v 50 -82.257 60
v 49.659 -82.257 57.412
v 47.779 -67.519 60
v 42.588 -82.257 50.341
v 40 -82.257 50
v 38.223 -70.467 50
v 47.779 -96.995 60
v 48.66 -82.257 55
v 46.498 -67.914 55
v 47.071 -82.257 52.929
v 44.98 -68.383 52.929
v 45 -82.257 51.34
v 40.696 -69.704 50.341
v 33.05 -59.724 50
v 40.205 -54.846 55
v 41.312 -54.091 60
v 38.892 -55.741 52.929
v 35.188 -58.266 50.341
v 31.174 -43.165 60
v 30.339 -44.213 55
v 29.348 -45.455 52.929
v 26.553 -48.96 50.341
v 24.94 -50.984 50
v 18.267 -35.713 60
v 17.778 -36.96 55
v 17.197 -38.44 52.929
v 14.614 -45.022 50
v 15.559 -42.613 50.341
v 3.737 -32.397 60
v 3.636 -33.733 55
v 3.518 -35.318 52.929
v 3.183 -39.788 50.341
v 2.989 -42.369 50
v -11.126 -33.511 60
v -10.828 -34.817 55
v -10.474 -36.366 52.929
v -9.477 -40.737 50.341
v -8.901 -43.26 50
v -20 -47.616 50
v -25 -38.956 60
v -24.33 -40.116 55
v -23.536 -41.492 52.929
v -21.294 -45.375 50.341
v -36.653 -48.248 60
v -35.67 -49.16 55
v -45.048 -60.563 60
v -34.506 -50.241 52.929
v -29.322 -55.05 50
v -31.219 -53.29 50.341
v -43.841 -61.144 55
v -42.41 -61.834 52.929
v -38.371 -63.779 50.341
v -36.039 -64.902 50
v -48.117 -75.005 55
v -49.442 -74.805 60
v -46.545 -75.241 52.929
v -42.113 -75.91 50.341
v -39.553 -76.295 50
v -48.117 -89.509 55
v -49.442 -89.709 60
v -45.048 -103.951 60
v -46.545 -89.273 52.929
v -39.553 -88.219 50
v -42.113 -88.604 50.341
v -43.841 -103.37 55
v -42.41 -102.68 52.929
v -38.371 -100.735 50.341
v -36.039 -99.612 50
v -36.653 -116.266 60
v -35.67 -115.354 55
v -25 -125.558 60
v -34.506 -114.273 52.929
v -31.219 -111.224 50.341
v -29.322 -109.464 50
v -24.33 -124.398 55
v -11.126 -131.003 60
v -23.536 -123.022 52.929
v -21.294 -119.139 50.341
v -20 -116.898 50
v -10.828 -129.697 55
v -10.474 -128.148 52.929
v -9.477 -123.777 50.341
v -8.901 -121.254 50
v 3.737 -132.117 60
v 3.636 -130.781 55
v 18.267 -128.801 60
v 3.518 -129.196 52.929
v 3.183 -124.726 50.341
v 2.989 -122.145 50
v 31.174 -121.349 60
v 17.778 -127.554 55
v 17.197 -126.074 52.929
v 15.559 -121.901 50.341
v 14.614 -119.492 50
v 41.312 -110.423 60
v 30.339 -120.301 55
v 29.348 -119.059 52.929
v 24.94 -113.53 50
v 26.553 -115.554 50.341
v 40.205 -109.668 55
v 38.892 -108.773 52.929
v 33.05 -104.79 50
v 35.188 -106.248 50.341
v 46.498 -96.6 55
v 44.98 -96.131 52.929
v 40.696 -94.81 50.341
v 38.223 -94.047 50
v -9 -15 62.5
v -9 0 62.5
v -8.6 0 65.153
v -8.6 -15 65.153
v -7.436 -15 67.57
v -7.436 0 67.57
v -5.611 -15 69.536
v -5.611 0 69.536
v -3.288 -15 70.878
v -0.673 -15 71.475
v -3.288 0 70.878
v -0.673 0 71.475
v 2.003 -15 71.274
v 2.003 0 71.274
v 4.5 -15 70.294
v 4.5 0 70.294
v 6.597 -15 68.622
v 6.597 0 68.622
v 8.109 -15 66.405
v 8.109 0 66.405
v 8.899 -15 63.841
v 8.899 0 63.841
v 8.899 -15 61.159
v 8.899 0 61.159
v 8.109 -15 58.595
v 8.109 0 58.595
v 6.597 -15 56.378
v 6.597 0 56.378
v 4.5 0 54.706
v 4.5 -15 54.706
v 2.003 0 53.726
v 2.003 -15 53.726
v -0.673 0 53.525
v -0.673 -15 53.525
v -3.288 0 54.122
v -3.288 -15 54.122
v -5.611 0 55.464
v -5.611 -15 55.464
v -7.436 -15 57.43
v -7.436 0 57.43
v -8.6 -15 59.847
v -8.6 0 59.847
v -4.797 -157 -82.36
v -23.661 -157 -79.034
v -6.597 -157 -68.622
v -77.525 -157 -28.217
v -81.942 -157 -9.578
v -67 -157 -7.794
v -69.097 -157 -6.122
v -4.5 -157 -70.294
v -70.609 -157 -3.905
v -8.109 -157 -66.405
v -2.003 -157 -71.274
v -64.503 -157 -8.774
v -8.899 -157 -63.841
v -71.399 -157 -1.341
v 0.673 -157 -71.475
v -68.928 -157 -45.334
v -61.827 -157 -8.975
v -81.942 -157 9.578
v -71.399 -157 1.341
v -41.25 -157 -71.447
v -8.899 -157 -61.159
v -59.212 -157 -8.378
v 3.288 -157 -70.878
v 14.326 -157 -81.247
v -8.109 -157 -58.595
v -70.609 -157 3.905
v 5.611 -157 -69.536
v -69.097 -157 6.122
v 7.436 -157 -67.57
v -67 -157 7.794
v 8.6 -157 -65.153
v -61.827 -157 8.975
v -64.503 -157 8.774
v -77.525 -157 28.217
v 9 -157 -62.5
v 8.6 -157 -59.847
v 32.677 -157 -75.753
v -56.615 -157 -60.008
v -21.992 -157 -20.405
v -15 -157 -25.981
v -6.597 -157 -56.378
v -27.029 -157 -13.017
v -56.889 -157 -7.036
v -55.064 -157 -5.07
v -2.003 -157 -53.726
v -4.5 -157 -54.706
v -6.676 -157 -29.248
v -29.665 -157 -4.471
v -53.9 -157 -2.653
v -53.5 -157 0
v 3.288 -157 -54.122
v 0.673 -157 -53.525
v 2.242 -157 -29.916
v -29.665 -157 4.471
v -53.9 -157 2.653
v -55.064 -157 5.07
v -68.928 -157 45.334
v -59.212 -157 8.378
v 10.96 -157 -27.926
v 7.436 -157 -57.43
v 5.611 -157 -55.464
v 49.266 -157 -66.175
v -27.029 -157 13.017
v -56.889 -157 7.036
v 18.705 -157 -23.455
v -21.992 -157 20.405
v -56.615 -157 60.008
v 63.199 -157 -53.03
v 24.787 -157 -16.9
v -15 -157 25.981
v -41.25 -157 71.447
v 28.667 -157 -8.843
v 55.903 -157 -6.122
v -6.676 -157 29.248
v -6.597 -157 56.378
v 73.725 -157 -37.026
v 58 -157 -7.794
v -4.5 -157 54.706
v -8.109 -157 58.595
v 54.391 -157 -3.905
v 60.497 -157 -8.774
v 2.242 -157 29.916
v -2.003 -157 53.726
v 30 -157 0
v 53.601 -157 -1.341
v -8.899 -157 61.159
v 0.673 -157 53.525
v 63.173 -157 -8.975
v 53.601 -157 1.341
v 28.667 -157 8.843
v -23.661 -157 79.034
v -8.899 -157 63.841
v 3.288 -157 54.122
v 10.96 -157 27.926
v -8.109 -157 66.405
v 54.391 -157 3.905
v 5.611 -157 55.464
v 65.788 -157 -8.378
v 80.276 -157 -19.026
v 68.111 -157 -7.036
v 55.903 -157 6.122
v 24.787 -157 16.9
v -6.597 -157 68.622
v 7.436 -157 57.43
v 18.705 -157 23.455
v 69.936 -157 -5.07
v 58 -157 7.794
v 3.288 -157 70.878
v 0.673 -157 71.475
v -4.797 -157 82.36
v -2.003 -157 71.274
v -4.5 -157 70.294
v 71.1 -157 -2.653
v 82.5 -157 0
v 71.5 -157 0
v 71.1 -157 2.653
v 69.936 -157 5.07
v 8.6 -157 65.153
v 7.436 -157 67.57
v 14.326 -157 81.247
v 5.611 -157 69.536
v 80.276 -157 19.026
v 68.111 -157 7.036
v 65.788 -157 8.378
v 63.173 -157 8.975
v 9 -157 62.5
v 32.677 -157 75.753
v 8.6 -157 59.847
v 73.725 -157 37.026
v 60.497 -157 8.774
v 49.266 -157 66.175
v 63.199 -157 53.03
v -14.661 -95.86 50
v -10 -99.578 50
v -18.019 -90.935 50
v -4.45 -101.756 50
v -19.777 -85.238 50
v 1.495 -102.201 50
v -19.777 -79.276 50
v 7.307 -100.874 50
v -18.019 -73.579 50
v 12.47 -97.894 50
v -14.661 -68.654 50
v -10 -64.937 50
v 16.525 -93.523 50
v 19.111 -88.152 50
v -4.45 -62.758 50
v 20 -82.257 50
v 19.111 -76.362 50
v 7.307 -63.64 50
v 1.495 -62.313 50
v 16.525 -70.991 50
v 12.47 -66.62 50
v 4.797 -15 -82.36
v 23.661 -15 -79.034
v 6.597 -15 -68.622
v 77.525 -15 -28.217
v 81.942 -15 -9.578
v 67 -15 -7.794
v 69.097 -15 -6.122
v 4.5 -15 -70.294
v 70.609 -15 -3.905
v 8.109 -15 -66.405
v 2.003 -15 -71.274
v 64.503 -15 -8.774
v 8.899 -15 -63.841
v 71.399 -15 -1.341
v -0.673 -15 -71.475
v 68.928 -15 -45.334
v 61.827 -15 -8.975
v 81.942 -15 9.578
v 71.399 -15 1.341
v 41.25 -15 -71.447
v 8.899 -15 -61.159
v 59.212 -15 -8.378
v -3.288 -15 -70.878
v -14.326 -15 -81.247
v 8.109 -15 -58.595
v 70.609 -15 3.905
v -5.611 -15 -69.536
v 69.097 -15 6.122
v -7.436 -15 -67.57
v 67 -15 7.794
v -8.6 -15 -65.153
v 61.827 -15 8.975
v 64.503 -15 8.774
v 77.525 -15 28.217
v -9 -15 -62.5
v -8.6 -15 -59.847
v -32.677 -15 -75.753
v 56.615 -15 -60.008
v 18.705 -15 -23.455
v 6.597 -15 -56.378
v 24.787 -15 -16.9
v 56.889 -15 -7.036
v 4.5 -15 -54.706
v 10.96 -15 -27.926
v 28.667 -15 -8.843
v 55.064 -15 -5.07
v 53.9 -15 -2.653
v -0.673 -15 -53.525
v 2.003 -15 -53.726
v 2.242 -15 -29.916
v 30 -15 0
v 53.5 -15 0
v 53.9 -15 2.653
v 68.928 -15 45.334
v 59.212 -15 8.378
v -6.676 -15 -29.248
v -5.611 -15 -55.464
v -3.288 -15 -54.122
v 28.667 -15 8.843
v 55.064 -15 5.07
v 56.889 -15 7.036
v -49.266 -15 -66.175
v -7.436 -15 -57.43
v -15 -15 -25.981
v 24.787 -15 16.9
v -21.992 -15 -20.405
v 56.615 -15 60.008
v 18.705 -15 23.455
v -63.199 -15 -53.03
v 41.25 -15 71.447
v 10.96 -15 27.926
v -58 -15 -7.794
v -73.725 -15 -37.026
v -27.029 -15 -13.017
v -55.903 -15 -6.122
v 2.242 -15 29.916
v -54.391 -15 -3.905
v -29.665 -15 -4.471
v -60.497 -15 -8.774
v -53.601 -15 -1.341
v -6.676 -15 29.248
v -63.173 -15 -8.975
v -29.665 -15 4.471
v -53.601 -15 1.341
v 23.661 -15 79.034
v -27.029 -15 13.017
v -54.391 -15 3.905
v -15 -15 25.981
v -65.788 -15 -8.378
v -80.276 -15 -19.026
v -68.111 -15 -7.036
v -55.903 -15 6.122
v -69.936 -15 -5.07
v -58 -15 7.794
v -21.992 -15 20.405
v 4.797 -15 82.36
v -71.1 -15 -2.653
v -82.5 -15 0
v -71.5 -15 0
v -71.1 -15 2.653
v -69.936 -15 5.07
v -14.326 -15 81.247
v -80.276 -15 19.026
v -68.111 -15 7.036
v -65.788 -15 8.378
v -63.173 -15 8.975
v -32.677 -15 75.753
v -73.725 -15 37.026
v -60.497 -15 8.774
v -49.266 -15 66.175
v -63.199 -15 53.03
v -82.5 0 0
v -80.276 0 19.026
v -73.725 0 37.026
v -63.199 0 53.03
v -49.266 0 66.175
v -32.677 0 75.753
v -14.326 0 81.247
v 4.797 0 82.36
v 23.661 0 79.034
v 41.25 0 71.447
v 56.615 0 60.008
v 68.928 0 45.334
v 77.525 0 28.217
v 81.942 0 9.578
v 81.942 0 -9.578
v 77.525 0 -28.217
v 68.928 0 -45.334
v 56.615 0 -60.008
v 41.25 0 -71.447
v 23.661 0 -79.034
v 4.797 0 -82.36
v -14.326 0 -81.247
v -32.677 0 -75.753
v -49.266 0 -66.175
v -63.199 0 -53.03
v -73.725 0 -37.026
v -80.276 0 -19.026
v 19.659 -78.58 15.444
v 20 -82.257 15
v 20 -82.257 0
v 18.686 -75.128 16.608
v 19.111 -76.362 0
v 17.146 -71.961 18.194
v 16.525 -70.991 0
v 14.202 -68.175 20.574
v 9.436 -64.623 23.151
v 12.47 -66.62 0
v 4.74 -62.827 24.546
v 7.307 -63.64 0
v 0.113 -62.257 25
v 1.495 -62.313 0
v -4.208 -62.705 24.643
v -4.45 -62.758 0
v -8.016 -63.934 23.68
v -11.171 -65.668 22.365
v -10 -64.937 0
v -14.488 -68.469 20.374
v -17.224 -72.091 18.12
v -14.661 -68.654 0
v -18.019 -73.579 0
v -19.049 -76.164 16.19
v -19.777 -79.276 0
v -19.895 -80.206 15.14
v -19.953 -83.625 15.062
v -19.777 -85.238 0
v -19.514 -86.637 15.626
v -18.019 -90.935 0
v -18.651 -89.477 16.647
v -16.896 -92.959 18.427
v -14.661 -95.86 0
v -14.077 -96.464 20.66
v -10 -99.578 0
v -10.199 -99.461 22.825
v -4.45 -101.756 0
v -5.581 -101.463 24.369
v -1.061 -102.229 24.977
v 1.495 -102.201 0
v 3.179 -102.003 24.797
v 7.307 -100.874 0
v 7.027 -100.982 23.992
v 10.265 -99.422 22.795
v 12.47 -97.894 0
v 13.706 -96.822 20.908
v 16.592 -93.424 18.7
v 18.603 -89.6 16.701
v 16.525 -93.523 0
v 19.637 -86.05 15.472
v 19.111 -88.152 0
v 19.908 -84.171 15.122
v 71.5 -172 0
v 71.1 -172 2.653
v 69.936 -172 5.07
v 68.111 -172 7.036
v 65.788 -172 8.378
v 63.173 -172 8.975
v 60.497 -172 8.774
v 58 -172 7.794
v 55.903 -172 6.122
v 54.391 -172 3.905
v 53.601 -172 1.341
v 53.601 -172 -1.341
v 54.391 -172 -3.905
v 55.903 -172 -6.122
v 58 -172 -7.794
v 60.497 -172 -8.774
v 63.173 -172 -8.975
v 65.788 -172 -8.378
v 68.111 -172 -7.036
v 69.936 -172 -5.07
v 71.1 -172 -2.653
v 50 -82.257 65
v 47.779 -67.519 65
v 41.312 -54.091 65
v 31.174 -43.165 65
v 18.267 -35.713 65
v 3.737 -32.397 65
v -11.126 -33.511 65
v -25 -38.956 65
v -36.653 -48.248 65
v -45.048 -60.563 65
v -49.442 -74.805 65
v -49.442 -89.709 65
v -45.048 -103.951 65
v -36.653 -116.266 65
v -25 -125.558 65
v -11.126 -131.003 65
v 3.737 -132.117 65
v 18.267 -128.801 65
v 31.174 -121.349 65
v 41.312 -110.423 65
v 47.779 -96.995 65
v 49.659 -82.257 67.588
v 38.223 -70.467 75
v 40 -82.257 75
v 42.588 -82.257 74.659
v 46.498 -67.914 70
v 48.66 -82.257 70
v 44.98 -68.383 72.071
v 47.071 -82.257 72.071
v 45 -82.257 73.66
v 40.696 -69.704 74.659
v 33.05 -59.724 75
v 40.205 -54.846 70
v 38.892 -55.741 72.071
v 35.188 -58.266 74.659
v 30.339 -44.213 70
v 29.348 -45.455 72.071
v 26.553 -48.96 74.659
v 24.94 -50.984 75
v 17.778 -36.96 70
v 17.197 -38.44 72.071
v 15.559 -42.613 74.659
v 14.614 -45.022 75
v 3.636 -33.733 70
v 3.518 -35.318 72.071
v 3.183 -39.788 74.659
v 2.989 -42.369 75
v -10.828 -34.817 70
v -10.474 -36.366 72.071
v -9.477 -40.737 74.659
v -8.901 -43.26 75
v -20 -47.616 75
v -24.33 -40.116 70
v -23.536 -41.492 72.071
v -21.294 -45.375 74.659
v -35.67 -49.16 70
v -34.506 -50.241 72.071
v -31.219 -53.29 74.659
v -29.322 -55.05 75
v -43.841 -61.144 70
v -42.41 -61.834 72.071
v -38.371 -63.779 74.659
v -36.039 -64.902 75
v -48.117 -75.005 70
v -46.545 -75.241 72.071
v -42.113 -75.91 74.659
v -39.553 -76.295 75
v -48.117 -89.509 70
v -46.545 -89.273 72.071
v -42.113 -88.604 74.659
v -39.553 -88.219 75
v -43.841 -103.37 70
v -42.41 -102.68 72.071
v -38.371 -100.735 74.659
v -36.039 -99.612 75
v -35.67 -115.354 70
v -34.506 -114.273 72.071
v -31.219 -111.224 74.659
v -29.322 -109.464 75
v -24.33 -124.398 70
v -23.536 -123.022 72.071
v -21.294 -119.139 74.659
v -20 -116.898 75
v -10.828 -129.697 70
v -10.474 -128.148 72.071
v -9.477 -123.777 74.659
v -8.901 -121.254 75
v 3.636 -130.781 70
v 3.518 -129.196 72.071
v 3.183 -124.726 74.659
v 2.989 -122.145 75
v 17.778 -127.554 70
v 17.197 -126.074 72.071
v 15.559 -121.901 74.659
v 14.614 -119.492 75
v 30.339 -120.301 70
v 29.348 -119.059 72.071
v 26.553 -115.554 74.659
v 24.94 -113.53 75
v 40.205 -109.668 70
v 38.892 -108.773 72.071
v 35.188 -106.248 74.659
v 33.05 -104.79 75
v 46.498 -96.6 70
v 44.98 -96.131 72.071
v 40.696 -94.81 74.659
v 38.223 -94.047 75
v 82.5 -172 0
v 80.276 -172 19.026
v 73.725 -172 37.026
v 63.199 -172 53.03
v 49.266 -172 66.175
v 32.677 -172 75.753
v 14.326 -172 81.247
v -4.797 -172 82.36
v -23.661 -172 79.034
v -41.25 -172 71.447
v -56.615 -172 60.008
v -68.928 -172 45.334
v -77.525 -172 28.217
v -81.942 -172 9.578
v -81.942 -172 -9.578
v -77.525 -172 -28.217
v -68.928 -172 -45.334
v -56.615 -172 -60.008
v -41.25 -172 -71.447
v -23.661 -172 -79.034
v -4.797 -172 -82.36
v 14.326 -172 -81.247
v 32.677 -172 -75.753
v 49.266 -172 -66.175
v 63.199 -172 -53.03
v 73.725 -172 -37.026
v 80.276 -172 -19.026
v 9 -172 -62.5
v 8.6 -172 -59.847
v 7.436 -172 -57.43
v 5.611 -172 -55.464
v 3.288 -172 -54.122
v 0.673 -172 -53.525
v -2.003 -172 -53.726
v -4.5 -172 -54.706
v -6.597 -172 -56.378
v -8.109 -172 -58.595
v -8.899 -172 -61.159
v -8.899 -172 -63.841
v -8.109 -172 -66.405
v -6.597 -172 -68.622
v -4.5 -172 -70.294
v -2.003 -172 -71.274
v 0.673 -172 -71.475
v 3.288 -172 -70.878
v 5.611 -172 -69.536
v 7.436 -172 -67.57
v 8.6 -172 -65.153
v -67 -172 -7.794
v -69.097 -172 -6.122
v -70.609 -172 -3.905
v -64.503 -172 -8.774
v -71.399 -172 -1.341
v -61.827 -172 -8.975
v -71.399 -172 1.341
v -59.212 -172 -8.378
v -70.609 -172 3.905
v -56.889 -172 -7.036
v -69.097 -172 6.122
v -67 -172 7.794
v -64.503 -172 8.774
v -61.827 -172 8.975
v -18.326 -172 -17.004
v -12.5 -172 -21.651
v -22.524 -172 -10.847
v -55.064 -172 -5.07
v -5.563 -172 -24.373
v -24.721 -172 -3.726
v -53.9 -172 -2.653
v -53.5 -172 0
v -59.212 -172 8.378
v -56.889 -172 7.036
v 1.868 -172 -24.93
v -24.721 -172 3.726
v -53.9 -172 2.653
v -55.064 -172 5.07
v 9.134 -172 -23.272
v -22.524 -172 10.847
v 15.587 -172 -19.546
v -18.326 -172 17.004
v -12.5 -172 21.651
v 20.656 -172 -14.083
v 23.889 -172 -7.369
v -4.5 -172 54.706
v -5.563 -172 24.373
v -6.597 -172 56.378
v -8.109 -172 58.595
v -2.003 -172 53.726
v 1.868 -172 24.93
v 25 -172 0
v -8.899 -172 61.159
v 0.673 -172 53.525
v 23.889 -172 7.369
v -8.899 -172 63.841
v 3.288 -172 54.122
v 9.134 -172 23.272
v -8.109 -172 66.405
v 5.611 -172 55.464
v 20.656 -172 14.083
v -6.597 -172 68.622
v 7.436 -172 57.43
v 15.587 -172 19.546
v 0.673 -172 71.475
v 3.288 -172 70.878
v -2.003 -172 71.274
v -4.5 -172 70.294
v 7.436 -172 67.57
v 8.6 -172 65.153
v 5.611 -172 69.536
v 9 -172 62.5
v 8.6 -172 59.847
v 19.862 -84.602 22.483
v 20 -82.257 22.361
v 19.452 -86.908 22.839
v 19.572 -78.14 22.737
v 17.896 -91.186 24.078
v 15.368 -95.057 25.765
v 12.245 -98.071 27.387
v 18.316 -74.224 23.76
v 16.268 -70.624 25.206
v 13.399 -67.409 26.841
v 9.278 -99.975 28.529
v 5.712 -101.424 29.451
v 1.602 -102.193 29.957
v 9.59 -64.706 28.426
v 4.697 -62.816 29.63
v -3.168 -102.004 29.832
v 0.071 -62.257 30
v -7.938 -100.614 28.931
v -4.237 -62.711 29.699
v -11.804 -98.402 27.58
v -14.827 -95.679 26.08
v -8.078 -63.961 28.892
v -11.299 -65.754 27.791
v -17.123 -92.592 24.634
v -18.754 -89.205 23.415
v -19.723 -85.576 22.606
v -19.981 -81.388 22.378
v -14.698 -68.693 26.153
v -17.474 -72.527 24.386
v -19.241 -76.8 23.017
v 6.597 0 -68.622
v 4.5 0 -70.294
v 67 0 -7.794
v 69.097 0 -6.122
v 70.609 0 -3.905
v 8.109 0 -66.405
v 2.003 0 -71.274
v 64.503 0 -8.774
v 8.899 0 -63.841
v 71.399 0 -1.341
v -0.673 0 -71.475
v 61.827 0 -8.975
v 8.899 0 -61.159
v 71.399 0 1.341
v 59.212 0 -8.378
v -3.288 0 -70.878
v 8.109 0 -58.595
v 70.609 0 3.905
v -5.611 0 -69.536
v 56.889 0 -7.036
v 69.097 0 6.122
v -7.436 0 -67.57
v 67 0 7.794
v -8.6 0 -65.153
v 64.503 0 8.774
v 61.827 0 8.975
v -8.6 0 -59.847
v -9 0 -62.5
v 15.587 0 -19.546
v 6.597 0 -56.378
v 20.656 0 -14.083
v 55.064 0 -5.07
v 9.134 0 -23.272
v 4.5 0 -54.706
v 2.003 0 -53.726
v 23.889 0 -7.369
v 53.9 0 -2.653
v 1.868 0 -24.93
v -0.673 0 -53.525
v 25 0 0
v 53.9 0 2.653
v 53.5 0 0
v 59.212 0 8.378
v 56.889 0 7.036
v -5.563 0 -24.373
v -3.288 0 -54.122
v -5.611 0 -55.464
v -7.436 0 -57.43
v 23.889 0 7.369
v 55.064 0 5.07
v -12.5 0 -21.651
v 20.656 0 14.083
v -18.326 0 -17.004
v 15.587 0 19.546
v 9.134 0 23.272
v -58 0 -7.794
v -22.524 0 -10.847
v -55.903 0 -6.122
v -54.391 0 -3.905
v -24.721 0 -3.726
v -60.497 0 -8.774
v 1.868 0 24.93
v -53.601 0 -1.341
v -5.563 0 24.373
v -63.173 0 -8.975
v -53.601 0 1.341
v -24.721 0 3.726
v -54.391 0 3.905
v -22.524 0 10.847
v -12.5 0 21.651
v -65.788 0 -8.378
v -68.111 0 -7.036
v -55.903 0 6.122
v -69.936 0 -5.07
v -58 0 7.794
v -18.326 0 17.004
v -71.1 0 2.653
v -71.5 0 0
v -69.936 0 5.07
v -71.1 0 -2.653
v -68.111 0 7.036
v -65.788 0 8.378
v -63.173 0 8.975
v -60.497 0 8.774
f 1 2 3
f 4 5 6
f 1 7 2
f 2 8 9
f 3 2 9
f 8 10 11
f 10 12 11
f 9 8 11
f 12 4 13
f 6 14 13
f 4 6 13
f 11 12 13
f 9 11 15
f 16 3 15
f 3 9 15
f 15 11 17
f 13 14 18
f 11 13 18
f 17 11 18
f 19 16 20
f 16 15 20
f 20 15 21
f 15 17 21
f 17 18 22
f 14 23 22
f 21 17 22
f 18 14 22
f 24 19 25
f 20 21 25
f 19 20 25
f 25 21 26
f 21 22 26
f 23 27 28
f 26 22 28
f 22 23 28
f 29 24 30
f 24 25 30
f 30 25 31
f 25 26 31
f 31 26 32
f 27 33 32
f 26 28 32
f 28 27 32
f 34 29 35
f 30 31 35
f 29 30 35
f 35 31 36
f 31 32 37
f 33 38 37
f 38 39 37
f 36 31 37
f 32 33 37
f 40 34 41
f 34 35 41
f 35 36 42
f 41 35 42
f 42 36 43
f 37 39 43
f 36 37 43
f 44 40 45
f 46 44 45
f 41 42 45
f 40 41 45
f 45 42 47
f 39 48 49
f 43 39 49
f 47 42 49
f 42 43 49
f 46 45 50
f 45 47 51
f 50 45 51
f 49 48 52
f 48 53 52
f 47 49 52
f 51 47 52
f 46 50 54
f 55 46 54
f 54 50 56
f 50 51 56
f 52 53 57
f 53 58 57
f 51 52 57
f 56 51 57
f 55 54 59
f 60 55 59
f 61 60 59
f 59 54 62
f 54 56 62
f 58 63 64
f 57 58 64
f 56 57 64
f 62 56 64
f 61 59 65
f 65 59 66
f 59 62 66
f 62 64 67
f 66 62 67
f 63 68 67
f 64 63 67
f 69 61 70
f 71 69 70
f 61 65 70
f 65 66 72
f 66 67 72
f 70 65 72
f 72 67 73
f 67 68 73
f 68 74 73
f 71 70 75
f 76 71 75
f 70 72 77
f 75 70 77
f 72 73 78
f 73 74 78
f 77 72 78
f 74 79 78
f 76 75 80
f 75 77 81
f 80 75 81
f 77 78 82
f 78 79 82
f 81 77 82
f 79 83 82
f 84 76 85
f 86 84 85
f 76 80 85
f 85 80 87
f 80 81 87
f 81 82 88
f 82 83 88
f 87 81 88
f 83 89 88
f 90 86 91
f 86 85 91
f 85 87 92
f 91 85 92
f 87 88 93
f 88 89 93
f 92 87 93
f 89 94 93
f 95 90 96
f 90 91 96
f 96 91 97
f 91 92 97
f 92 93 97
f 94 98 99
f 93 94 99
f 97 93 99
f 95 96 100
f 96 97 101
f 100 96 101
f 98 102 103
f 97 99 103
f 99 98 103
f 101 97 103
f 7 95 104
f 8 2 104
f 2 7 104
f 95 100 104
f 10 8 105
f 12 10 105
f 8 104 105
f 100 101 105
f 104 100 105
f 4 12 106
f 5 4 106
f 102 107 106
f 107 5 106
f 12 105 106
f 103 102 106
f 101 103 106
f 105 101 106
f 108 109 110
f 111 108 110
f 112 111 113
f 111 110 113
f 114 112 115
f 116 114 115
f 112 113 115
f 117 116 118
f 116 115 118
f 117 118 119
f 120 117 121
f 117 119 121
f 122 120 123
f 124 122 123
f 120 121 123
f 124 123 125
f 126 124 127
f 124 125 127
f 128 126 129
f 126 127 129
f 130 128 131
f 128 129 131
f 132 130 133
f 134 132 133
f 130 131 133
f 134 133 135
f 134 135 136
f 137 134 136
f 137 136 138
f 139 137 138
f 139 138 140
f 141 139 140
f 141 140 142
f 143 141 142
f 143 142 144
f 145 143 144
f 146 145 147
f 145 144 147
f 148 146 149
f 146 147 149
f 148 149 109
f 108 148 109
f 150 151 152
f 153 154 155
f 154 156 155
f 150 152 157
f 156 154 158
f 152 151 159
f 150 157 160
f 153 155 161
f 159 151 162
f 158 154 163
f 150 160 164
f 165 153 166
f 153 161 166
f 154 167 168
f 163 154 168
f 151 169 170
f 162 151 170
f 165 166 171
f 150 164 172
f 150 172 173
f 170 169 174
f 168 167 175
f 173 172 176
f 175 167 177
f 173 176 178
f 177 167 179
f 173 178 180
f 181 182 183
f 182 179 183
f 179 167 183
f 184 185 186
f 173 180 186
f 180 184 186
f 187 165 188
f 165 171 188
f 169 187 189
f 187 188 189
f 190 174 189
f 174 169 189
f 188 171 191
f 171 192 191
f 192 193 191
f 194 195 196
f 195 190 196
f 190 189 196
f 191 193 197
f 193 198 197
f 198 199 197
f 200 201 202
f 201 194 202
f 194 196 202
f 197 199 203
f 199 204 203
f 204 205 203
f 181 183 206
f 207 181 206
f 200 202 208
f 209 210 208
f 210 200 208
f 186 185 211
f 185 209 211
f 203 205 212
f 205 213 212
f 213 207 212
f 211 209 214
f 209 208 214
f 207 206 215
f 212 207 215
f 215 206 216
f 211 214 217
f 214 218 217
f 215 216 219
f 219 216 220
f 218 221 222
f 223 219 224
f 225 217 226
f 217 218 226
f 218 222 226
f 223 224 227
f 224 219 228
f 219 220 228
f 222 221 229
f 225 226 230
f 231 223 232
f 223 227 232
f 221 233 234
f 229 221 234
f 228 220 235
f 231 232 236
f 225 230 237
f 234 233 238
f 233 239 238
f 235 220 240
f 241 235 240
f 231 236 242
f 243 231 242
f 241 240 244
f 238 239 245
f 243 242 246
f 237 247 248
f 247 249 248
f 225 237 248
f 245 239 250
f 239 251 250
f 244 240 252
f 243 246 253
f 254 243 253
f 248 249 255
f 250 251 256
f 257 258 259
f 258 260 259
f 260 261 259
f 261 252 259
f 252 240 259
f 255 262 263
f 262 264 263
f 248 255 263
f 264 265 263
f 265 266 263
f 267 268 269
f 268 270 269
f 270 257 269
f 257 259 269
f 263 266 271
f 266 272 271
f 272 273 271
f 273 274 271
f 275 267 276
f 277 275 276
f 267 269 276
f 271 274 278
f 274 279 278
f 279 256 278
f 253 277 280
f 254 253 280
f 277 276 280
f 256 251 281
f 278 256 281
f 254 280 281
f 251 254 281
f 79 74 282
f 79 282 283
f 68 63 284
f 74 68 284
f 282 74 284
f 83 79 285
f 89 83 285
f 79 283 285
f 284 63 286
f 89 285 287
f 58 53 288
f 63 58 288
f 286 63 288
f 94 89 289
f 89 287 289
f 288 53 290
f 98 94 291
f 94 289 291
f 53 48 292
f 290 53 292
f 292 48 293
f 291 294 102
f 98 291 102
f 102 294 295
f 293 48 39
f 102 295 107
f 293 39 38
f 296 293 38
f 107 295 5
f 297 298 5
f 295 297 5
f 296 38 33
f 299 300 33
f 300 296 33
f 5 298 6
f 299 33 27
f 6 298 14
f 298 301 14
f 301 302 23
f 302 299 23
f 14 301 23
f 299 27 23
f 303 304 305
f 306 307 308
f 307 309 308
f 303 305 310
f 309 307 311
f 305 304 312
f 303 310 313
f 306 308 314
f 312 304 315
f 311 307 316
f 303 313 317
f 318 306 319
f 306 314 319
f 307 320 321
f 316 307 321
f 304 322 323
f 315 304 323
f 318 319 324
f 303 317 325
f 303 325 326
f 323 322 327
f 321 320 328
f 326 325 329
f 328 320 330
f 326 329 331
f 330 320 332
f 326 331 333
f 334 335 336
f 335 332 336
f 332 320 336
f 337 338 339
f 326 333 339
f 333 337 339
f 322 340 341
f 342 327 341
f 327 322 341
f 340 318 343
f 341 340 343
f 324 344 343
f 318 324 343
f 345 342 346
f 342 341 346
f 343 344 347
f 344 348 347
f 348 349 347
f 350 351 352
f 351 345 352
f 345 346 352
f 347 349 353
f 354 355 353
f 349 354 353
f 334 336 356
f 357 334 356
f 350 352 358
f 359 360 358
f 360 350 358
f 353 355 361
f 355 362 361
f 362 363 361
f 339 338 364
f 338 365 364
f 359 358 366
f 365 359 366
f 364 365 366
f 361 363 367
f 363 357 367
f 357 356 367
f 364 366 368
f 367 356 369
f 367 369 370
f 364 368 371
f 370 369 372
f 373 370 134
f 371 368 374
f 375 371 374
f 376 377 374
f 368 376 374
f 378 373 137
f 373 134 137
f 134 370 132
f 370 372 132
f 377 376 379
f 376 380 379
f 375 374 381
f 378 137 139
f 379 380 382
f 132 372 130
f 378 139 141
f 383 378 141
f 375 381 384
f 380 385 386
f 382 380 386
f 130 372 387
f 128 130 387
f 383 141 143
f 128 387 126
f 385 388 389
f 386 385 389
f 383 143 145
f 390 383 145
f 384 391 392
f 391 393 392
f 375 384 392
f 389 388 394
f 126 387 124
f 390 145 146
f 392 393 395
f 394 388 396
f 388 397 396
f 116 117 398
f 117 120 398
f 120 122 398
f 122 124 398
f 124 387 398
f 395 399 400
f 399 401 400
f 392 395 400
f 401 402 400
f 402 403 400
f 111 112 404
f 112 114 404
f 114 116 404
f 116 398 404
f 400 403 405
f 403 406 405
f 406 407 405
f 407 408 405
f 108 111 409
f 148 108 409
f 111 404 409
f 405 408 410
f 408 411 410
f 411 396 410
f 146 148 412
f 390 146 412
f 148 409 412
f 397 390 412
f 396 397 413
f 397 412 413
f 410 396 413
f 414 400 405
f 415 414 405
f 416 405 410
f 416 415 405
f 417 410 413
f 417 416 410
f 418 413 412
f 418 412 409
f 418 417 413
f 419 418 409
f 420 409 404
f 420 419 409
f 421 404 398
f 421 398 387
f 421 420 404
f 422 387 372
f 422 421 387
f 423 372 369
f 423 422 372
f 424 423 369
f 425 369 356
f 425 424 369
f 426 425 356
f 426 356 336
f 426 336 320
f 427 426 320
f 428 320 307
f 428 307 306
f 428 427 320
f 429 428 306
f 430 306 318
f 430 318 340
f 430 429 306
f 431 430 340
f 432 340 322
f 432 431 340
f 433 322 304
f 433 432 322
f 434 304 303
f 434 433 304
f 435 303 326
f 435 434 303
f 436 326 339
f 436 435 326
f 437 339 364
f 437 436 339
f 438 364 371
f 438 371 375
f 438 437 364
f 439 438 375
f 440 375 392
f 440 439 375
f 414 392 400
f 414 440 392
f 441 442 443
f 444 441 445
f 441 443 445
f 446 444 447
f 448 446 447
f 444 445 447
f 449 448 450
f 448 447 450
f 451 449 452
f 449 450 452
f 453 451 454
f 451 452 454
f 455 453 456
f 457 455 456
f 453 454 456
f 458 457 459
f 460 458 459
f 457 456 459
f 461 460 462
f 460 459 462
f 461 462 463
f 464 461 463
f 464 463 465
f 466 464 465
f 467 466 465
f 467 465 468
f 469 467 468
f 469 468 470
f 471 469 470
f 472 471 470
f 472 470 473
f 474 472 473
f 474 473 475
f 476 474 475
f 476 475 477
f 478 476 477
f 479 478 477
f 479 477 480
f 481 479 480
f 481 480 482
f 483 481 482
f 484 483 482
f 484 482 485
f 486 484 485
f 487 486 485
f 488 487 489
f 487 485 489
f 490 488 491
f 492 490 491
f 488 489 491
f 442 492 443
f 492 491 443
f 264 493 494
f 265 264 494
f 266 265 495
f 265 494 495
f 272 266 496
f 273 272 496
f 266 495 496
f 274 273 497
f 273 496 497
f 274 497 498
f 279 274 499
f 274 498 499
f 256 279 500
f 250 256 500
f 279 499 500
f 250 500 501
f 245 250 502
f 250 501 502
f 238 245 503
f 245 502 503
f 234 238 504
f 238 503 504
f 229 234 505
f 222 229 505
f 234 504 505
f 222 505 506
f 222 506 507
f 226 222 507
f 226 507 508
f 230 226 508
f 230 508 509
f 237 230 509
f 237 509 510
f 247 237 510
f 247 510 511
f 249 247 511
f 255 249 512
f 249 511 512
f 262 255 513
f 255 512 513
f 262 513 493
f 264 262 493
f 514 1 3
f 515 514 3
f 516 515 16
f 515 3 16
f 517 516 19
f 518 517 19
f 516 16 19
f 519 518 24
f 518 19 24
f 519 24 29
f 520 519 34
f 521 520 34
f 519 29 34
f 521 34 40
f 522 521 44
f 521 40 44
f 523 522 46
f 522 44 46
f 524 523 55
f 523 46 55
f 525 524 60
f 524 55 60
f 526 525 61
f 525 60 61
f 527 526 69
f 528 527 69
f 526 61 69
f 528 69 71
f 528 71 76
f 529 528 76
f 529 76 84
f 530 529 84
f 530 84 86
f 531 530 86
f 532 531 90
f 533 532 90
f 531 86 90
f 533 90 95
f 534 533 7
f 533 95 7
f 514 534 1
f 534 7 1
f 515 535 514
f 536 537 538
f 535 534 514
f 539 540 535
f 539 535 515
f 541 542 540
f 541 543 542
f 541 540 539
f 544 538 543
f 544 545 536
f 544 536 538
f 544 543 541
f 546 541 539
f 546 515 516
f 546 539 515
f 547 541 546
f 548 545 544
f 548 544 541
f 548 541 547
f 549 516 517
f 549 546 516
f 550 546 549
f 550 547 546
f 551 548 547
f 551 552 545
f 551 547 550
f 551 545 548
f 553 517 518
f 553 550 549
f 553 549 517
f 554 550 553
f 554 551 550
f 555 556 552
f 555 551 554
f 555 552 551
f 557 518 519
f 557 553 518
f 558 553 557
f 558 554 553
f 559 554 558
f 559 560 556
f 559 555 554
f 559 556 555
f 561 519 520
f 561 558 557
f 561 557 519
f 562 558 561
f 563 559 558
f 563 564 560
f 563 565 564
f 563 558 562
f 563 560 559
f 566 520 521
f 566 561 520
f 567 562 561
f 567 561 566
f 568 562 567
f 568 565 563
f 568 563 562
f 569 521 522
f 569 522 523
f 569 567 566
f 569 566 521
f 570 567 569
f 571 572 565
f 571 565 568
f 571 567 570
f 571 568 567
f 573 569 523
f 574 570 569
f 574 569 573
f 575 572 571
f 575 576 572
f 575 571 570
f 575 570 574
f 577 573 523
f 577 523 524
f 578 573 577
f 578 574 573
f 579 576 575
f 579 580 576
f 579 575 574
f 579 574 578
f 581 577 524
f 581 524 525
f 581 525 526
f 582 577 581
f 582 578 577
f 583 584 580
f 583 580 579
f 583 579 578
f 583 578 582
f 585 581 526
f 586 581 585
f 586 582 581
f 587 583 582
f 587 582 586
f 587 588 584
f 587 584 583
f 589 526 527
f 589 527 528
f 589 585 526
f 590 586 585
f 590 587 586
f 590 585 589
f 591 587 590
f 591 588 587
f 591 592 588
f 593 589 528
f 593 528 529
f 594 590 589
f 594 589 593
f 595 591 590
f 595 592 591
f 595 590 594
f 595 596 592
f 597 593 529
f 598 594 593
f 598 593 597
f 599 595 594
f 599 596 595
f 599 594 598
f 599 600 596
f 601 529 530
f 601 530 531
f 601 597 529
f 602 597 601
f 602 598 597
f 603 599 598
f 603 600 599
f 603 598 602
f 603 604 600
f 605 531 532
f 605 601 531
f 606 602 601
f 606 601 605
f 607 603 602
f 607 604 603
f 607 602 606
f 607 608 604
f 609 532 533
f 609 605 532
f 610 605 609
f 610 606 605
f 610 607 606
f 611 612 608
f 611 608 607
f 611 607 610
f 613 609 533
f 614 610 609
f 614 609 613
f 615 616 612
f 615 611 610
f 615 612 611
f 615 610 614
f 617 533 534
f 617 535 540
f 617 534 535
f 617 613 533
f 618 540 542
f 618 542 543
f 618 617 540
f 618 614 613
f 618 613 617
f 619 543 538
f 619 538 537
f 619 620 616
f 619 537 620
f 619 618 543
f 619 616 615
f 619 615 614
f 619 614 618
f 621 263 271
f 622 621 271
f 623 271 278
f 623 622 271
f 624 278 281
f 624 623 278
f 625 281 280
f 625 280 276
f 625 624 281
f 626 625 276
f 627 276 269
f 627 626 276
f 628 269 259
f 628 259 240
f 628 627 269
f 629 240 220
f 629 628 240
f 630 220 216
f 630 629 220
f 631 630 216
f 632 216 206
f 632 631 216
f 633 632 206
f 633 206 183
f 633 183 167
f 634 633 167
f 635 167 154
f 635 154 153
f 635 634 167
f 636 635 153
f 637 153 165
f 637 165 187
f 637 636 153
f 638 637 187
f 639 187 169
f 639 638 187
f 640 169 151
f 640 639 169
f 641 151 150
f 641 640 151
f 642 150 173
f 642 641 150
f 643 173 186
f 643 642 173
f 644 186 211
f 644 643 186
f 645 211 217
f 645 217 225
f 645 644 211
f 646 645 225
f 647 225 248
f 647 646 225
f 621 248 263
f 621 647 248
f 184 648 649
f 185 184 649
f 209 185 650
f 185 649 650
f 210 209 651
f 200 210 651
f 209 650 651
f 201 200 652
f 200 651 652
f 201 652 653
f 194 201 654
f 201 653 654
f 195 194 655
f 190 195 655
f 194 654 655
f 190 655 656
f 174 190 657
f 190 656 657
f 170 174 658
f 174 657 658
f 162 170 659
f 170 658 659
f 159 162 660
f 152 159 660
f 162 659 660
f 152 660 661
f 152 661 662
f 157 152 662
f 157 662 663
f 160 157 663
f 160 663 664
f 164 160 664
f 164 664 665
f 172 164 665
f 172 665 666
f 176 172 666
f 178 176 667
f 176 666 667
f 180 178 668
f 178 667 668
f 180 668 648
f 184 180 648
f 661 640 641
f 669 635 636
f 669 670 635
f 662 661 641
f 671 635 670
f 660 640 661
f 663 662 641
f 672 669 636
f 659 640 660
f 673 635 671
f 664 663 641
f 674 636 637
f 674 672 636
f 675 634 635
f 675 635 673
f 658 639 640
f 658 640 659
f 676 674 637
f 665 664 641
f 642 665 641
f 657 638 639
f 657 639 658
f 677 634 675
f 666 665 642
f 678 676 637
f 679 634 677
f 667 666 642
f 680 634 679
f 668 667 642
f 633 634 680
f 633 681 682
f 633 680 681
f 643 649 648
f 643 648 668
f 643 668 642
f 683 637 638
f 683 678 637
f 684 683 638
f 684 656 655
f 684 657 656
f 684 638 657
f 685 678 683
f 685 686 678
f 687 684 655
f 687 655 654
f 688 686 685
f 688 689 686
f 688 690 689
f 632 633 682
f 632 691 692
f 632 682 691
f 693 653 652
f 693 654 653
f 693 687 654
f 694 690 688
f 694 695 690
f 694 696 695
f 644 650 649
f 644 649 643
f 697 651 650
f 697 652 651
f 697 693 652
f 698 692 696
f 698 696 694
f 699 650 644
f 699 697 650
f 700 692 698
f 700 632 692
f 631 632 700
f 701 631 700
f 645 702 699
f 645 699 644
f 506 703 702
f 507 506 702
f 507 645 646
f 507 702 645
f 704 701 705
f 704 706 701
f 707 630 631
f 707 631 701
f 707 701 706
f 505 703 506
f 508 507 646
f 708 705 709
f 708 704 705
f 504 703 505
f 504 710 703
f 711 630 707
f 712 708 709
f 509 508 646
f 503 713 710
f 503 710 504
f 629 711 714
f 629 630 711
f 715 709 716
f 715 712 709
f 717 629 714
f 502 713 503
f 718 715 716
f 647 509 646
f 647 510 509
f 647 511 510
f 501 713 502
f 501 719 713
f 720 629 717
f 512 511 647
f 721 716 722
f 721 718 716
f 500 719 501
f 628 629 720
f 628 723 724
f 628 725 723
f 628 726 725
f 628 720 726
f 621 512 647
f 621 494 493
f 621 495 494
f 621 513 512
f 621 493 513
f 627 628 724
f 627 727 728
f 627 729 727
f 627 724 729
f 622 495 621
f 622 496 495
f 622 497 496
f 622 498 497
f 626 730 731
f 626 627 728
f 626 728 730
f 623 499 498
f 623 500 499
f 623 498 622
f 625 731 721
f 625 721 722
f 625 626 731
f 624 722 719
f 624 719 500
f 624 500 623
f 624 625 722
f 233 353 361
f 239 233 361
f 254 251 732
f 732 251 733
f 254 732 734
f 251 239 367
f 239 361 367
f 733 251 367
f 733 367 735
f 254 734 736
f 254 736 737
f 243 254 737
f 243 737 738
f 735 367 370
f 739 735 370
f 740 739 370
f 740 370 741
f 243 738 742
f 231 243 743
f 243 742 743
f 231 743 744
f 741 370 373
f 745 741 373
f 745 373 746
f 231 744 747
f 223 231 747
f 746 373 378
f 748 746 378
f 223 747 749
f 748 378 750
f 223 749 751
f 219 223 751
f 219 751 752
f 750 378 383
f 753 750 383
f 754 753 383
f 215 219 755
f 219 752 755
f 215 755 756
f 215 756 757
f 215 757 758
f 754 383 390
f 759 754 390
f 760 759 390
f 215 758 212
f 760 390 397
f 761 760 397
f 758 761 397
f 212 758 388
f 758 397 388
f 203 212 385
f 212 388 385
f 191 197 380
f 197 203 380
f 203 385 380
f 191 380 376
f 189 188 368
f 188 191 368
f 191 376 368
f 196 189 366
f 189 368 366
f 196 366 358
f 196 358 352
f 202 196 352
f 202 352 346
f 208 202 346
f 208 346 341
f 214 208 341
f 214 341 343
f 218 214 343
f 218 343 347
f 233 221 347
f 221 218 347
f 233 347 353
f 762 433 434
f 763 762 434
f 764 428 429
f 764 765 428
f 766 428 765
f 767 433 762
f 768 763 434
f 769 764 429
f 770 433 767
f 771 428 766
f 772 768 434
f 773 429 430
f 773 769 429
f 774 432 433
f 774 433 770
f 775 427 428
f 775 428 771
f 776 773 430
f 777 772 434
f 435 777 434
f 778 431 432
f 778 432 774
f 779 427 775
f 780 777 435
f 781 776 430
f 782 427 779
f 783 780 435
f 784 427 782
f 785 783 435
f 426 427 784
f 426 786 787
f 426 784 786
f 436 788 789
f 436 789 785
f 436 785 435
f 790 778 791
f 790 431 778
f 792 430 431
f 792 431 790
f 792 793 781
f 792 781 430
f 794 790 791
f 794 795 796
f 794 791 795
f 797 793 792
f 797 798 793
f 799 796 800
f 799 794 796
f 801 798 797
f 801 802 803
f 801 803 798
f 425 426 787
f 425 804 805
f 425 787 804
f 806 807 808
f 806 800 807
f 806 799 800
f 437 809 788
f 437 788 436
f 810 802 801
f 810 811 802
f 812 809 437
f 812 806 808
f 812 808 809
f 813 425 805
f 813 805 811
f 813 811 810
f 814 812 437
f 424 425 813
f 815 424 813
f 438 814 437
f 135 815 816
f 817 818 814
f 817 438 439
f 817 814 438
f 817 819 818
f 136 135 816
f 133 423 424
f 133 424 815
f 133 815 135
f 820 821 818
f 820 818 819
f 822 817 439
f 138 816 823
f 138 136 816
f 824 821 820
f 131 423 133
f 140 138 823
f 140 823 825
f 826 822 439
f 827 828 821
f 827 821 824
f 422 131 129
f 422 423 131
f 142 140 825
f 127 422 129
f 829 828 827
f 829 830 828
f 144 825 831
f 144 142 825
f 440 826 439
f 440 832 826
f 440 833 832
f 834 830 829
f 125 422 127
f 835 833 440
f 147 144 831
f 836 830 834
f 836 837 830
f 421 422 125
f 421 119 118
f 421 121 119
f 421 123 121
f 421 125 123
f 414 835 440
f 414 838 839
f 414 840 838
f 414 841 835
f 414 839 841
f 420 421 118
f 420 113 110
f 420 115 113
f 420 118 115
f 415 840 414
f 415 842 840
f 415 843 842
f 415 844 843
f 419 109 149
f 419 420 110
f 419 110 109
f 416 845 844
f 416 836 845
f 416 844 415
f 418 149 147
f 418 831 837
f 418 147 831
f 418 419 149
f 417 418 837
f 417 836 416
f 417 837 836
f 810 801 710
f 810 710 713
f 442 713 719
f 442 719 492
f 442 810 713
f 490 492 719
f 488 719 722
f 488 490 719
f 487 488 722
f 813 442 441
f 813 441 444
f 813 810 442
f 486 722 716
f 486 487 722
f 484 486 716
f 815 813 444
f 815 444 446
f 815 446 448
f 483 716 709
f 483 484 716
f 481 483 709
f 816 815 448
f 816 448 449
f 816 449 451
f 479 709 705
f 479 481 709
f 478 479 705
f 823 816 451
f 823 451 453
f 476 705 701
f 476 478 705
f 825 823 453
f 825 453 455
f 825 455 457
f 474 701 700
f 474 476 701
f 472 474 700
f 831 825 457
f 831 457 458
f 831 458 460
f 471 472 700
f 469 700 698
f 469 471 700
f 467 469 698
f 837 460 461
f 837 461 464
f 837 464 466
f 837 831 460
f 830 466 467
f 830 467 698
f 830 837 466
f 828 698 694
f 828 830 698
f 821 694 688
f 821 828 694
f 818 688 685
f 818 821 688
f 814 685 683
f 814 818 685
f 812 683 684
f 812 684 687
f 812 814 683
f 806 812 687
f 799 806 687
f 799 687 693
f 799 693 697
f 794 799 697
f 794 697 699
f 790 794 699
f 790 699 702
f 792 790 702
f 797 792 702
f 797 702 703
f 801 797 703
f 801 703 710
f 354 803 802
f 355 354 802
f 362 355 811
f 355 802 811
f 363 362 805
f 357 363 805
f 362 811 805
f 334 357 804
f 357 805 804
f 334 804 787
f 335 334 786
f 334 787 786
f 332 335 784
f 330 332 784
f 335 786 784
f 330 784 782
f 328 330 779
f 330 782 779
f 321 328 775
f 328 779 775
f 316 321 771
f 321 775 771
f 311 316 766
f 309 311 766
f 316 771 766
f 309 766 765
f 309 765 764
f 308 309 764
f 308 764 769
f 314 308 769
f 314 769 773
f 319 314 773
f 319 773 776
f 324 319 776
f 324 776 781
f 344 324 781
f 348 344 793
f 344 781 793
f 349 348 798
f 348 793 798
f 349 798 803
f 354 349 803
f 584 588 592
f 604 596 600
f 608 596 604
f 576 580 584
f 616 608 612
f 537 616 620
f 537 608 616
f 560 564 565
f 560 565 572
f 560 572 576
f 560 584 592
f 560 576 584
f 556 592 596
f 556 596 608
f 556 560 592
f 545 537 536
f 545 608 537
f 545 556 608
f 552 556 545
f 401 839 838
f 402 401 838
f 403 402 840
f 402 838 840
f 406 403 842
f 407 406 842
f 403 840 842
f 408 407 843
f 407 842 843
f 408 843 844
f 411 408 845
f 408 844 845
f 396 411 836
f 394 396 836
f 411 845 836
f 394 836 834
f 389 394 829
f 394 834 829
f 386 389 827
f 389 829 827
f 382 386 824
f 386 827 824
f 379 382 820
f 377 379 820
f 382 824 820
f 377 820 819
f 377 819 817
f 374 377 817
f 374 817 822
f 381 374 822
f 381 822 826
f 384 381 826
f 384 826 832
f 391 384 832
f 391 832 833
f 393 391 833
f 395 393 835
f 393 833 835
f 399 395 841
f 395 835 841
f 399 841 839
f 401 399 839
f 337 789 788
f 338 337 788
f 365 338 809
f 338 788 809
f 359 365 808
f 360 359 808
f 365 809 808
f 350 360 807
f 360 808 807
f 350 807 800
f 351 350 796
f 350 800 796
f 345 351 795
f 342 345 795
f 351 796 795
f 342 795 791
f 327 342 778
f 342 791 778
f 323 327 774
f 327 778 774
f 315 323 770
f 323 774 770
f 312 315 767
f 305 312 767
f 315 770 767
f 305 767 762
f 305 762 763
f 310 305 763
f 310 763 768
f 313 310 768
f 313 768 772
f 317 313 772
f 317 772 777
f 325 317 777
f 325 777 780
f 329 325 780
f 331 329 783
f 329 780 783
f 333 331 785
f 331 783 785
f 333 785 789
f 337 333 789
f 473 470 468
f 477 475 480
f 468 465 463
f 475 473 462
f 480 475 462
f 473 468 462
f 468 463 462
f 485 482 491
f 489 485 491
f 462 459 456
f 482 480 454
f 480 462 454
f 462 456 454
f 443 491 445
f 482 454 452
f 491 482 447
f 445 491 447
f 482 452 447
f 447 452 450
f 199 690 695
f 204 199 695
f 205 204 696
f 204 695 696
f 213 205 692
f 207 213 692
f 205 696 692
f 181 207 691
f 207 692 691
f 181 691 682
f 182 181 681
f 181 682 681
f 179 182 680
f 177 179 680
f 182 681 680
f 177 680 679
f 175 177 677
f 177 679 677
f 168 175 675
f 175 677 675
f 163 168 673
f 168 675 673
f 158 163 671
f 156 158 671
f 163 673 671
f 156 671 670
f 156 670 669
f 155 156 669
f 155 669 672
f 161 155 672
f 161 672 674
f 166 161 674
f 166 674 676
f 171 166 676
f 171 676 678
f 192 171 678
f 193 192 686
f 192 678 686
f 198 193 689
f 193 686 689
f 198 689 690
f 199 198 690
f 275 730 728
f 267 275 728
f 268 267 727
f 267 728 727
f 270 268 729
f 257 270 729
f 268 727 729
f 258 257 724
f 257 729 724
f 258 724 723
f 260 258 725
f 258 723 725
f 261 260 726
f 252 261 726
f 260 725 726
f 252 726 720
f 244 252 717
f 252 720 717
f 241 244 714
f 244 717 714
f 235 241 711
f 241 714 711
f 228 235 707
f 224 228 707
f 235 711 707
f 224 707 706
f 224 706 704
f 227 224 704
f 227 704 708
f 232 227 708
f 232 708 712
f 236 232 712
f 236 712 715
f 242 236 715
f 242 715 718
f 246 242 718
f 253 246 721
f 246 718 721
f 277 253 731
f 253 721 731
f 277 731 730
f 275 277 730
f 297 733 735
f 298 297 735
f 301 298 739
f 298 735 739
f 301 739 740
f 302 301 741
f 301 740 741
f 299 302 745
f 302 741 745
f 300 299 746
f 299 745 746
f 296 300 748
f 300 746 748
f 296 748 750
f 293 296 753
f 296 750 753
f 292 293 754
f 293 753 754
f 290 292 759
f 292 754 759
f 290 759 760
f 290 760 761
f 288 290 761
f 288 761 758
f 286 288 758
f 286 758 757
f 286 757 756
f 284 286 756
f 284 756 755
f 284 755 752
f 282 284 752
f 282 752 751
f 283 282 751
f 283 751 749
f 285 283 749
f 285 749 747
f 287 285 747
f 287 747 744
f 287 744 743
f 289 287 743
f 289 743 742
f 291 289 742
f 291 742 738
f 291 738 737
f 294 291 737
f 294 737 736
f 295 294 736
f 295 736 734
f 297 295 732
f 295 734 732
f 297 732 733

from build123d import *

# Parameters (mm, degrees)
F0_R     = 30
F0_R_2   = 25
F1_DEPTH = 172
F2_R     = 82.5
F2_R_2   = 9
F2_R_3   = 30
F3_DEPTH = 15
F4_R     = 82.5
F4_R_2   = 9
F4_R_3   = 25
F5_DEPTH = 15
F6_R     = 20
F7_DEPTH = 50
F8_R     = 50
F8_R_2   = 20
F9_DEPTH = 25
F10_R    = 10


with BuildPart() as f1:
    # F0 (on Front) → F1 (new body)
    with BuildSketch(Plane.XZ):
        Circle(F0_R)
        Circle(F0_R_2, mode=Mode.SUBTRACT)
    extrude(amount=F1_DEPTH)

    # F2 (on face) → F3 (join)
    with BuildSketch(Plane(origin=(0, 0, 0), x_dir=(-1, 0, 0), z_dir=(0, 1, 0))):
        Circle(F2_R)
        with Locations((0, -62.5)):
            Circle(F2_R_2, mode=Mode.SUBTRACT)
        with Locations((-62.5, 0)):
            Circle(F2_R_2, mode=Mode.SUBTRACT)
        Circle(F2_R_3, mode=Mode.SUBTRACT)
        with Locations((62.5, 0)):
            Circle(F2_R_2, mode=Mode.SUBTRACT)
        with Locations((0, 62.5)):
            Circle(F2_R_2, mode=Mode.SUBTRACT)
    extrude(amount=-F3_DEPTH)

    # F4 (on face) → F5 (join)
    with BuildSketch(Plane.XZ.offset(172)):
        Circle(F4_R)
        with Locations((0, -62.5)):
            Circle(F4_R_2, mode=Mode.SUBTRACT)
        with Locations((-62.5, 0)):
            Circle(F4_R_2, mode=Mode.SUBTRACT)
        Circle(F4_R_3, mode=Mode.SUBTRACT)
        with Locations((62.5, 0)):
            Circle(F4_R_2, mode=Mode.SUBTRACT)
        with Locations((0, 62.5)):
            Circle(F4_R_2, mode=Mode.SUBTRACT)
    extrude(amount=-F5_DEPTH)

    # F6 (on Top) → F7 (join)
    with BuildSketch(Plane.XY):
        with Locations((0, -82.25701)):
            Circle(F6_R)
    extrude(amount=F7_DEPTH)

    # F8 (on face) → F9 (join)
    with BuildSketch(Plane.XY.offset(50)):
        with Locations((0, -82.25701)):
            Circle(F8_R)
        with Locations((0, -82.25701)):
            Circle(F8_R_2, mode=Mode.SUBTRACT)
        with Locations((0, -82.25701)):
            Circle(F8_R_2)
    extrude(amount=F9_DEPTH)

    # F10
    f10_edges = [f1.edges().sort_by_distance(p)[0] for p in [
        (-50, -82.25701, 75),
        (-50, -82.25701, 50),
    ]]
    fillet(f10_edges, radius=F10_R)


solid = f1.part
